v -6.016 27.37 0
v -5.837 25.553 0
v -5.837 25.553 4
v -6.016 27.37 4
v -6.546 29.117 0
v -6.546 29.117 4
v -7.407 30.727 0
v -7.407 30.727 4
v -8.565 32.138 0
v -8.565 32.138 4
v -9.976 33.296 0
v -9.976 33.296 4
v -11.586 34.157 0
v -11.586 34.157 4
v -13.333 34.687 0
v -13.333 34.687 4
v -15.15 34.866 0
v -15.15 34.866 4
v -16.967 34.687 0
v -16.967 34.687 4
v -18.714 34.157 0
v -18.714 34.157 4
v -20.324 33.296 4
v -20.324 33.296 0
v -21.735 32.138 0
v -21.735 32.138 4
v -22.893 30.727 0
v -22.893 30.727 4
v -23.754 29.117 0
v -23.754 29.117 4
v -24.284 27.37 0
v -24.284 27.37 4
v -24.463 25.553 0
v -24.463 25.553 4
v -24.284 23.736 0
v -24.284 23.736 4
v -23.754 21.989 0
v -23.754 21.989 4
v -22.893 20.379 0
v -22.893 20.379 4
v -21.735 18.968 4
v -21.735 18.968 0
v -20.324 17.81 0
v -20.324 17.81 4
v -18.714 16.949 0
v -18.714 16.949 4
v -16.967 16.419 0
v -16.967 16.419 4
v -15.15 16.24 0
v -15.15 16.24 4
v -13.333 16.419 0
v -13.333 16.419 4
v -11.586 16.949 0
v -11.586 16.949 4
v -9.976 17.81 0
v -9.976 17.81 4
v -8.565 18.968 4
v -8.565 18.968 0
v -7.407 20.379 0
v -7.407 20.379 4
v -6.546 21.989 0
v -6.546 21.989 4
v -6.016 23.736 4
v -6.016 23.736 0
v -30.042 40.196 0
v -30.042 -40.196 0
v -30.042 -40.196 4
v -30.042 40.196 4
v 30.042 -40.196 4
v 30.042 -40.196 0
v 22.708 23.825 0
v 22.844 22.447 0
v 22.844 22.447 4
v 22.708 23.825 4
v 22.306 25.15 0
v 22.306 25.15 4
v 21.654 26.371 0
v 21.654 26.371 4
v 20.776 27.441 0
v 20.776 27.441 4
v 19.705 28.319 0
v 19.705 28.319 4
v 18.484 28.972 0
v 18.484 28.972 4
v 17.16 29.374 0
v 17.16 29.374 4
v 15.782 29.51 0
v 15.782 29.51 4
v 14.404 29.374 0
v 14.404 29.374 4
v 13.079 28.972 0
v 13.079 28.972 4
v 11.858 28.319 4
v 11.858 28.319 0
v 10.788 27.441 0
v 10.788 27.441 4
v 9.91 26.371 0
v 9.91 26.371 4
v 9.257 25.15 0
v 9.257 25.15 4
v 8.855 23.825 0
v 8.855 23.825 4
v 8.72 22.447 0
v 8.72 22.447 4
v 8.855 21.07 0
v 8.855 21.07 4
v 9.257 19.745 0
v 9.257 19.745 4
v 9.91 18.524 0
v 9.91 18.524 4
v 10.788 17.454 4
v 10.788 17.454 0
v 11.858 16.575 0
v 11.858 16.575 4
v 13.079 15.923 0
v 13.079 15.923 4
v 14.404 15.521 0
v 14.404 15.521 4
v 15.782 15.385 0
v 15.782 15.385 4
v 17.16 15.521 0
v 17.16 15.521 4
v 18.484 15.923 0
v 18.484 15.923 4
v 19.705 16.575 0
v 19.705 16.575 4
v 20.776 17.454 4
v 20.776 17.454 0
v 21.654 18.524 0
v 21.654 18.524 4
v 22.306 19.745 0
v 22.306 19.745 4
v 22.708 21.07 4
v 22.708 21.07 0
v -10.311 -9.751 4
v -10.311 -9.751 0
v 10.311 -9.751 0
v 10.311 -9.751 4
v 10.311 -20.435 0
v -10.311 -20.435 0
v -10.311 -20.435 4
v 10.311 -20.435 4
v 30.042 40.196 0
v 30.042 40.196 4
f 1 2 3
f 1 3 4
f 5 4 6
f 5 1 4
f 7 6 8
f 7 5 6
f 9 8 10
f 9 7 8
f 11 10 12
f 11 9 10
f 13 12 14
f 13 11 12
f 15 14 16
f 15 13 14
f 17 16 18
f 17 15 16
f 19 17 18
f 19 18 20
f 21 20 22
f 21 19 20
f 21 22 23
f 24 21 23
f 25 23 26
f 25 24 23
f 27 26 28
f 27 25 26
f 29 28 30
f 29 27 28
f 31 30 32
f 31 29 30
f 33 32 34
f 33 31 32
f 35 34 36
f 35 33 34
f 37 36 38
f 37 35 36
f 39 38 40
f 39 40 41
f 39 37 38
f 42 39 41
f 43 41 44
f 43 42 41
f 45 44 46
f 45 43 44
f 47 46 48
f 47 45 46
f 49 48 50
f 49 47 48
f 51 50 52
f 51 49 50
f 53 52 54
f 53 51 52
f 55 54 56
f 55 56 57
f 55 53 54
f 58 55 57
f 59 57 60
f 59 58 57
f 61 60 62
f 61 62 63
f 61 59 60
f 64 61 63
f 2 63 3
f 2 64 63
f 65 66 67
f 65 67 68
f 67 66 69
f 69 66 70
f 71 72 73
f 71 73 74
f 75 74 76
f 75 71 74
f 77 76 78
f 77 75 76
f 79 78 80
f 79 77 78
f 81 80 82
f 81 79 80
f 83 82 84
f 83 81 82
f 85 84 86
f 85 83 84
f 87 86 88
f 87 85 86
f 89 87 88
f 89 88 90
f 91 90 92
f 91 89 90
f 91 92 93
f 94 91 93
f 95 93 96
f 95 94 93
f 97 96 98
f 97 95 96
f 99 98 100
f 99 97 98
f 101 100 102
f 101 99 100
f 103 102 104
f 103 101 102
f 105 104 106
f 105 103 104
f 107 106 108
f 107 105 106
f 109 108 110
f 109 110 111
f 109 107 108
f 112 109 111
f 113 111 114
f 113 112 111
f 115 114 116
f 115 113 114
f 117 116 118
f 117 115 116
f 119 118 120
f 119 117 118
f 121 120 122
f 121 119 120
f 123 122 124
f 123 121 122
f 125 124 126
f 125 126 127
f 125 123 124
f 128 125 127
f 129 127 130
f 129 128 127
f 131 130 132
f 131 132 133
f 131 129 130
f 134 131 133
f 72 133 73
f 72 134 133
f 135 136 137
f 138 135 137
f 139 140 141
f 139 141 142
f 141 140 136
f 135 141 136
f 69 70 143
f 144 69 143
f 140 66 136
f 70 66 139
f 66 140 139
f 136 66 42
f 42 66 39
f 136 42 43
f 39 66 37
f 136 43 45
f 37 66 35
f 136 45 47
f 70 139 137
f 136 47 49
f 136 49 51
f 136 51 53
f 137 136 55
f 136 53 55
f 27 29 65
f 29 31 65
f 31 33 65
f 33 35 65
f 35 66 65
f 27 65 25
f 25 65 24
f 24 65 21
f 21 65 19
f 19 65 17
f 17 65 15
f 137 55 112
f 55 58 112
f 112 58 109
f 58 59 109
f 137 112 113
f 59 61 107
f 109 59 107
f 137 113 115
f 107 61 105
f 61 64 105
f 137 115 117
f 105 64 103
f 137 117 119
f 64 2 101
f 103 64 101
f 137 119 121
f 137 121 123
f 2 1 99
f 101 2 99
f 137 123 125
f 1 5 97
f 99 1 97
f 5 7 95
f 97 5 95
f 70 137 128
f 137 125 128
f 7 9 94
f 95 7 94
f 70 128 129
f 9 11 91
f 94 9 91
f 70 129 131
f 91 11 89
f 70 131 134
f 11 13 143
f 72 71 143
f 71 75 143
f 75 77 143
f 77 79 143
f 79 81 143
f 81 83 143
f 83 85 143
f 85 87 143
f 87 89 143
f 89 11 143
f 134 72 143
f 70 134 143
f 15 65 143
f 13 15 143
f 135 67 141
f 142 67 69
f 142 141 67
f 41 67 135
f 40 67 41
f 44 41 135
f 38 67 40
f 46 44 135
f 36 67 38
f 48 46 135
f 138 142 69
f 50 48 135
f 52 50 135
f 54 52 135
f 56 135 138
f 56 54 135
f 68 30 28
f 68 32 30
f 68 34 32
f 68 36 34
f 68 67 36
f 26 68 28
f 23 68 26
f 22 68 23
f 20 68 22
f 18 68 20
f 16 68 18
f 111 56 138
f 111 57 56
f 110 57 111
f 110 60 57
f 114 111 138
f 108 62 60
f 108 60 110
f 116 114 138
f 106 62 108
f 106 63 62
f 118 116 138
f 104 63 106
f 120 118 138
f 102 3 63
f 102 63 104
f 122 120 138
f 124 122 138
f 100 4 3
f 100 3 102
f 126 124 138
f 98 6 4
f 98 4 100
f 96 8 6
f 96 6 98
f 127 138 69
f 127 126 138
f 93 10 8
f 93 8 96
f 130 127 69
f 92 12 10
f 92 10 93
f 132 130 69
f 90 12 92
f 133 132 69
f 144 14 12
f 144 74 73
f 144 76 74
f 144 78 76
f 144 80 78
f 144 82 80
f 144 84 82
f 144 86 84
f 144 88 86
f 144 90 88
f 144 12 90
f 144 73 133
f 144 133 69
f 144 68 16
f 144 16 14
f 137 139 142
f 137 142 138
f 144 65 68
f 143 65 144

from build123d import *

# Parameters (mm, degrees)
SKETCH_W      = 60.084118
SKETCH_H      = 80.392258
SKETCH_R      = 9.312632
SKETCH_R_2    = 7.062198
SKETCH_W_2    = 20.62126
SKETCH_H_2    = 10.683233
EXTRUDE_DEPTH = 4


with BuildPart() as part:
    # Sketch → Extrude (new body)
    with BuildSketch(Plane.XY):
        Rectangle(SKETCH_W, SKETCH_H)
        with Locations((-15.149905, 25.553061)):
            Circle(SKETCH_R, mode=Mode.SUBTRACT)
        with Locations((15.781789, 22.447472)):
            Circle(SKETCH_R_2, mode=Mode.SUBTRACT)
        with Locations((0, -15.092993)):
            Rectangle(SKETCH_W_2, SKETCH_H_2, mode=Mode.SUBTRACT)
    extrude(amount=EXTRUDE_DEPTH)


solid = part.part
